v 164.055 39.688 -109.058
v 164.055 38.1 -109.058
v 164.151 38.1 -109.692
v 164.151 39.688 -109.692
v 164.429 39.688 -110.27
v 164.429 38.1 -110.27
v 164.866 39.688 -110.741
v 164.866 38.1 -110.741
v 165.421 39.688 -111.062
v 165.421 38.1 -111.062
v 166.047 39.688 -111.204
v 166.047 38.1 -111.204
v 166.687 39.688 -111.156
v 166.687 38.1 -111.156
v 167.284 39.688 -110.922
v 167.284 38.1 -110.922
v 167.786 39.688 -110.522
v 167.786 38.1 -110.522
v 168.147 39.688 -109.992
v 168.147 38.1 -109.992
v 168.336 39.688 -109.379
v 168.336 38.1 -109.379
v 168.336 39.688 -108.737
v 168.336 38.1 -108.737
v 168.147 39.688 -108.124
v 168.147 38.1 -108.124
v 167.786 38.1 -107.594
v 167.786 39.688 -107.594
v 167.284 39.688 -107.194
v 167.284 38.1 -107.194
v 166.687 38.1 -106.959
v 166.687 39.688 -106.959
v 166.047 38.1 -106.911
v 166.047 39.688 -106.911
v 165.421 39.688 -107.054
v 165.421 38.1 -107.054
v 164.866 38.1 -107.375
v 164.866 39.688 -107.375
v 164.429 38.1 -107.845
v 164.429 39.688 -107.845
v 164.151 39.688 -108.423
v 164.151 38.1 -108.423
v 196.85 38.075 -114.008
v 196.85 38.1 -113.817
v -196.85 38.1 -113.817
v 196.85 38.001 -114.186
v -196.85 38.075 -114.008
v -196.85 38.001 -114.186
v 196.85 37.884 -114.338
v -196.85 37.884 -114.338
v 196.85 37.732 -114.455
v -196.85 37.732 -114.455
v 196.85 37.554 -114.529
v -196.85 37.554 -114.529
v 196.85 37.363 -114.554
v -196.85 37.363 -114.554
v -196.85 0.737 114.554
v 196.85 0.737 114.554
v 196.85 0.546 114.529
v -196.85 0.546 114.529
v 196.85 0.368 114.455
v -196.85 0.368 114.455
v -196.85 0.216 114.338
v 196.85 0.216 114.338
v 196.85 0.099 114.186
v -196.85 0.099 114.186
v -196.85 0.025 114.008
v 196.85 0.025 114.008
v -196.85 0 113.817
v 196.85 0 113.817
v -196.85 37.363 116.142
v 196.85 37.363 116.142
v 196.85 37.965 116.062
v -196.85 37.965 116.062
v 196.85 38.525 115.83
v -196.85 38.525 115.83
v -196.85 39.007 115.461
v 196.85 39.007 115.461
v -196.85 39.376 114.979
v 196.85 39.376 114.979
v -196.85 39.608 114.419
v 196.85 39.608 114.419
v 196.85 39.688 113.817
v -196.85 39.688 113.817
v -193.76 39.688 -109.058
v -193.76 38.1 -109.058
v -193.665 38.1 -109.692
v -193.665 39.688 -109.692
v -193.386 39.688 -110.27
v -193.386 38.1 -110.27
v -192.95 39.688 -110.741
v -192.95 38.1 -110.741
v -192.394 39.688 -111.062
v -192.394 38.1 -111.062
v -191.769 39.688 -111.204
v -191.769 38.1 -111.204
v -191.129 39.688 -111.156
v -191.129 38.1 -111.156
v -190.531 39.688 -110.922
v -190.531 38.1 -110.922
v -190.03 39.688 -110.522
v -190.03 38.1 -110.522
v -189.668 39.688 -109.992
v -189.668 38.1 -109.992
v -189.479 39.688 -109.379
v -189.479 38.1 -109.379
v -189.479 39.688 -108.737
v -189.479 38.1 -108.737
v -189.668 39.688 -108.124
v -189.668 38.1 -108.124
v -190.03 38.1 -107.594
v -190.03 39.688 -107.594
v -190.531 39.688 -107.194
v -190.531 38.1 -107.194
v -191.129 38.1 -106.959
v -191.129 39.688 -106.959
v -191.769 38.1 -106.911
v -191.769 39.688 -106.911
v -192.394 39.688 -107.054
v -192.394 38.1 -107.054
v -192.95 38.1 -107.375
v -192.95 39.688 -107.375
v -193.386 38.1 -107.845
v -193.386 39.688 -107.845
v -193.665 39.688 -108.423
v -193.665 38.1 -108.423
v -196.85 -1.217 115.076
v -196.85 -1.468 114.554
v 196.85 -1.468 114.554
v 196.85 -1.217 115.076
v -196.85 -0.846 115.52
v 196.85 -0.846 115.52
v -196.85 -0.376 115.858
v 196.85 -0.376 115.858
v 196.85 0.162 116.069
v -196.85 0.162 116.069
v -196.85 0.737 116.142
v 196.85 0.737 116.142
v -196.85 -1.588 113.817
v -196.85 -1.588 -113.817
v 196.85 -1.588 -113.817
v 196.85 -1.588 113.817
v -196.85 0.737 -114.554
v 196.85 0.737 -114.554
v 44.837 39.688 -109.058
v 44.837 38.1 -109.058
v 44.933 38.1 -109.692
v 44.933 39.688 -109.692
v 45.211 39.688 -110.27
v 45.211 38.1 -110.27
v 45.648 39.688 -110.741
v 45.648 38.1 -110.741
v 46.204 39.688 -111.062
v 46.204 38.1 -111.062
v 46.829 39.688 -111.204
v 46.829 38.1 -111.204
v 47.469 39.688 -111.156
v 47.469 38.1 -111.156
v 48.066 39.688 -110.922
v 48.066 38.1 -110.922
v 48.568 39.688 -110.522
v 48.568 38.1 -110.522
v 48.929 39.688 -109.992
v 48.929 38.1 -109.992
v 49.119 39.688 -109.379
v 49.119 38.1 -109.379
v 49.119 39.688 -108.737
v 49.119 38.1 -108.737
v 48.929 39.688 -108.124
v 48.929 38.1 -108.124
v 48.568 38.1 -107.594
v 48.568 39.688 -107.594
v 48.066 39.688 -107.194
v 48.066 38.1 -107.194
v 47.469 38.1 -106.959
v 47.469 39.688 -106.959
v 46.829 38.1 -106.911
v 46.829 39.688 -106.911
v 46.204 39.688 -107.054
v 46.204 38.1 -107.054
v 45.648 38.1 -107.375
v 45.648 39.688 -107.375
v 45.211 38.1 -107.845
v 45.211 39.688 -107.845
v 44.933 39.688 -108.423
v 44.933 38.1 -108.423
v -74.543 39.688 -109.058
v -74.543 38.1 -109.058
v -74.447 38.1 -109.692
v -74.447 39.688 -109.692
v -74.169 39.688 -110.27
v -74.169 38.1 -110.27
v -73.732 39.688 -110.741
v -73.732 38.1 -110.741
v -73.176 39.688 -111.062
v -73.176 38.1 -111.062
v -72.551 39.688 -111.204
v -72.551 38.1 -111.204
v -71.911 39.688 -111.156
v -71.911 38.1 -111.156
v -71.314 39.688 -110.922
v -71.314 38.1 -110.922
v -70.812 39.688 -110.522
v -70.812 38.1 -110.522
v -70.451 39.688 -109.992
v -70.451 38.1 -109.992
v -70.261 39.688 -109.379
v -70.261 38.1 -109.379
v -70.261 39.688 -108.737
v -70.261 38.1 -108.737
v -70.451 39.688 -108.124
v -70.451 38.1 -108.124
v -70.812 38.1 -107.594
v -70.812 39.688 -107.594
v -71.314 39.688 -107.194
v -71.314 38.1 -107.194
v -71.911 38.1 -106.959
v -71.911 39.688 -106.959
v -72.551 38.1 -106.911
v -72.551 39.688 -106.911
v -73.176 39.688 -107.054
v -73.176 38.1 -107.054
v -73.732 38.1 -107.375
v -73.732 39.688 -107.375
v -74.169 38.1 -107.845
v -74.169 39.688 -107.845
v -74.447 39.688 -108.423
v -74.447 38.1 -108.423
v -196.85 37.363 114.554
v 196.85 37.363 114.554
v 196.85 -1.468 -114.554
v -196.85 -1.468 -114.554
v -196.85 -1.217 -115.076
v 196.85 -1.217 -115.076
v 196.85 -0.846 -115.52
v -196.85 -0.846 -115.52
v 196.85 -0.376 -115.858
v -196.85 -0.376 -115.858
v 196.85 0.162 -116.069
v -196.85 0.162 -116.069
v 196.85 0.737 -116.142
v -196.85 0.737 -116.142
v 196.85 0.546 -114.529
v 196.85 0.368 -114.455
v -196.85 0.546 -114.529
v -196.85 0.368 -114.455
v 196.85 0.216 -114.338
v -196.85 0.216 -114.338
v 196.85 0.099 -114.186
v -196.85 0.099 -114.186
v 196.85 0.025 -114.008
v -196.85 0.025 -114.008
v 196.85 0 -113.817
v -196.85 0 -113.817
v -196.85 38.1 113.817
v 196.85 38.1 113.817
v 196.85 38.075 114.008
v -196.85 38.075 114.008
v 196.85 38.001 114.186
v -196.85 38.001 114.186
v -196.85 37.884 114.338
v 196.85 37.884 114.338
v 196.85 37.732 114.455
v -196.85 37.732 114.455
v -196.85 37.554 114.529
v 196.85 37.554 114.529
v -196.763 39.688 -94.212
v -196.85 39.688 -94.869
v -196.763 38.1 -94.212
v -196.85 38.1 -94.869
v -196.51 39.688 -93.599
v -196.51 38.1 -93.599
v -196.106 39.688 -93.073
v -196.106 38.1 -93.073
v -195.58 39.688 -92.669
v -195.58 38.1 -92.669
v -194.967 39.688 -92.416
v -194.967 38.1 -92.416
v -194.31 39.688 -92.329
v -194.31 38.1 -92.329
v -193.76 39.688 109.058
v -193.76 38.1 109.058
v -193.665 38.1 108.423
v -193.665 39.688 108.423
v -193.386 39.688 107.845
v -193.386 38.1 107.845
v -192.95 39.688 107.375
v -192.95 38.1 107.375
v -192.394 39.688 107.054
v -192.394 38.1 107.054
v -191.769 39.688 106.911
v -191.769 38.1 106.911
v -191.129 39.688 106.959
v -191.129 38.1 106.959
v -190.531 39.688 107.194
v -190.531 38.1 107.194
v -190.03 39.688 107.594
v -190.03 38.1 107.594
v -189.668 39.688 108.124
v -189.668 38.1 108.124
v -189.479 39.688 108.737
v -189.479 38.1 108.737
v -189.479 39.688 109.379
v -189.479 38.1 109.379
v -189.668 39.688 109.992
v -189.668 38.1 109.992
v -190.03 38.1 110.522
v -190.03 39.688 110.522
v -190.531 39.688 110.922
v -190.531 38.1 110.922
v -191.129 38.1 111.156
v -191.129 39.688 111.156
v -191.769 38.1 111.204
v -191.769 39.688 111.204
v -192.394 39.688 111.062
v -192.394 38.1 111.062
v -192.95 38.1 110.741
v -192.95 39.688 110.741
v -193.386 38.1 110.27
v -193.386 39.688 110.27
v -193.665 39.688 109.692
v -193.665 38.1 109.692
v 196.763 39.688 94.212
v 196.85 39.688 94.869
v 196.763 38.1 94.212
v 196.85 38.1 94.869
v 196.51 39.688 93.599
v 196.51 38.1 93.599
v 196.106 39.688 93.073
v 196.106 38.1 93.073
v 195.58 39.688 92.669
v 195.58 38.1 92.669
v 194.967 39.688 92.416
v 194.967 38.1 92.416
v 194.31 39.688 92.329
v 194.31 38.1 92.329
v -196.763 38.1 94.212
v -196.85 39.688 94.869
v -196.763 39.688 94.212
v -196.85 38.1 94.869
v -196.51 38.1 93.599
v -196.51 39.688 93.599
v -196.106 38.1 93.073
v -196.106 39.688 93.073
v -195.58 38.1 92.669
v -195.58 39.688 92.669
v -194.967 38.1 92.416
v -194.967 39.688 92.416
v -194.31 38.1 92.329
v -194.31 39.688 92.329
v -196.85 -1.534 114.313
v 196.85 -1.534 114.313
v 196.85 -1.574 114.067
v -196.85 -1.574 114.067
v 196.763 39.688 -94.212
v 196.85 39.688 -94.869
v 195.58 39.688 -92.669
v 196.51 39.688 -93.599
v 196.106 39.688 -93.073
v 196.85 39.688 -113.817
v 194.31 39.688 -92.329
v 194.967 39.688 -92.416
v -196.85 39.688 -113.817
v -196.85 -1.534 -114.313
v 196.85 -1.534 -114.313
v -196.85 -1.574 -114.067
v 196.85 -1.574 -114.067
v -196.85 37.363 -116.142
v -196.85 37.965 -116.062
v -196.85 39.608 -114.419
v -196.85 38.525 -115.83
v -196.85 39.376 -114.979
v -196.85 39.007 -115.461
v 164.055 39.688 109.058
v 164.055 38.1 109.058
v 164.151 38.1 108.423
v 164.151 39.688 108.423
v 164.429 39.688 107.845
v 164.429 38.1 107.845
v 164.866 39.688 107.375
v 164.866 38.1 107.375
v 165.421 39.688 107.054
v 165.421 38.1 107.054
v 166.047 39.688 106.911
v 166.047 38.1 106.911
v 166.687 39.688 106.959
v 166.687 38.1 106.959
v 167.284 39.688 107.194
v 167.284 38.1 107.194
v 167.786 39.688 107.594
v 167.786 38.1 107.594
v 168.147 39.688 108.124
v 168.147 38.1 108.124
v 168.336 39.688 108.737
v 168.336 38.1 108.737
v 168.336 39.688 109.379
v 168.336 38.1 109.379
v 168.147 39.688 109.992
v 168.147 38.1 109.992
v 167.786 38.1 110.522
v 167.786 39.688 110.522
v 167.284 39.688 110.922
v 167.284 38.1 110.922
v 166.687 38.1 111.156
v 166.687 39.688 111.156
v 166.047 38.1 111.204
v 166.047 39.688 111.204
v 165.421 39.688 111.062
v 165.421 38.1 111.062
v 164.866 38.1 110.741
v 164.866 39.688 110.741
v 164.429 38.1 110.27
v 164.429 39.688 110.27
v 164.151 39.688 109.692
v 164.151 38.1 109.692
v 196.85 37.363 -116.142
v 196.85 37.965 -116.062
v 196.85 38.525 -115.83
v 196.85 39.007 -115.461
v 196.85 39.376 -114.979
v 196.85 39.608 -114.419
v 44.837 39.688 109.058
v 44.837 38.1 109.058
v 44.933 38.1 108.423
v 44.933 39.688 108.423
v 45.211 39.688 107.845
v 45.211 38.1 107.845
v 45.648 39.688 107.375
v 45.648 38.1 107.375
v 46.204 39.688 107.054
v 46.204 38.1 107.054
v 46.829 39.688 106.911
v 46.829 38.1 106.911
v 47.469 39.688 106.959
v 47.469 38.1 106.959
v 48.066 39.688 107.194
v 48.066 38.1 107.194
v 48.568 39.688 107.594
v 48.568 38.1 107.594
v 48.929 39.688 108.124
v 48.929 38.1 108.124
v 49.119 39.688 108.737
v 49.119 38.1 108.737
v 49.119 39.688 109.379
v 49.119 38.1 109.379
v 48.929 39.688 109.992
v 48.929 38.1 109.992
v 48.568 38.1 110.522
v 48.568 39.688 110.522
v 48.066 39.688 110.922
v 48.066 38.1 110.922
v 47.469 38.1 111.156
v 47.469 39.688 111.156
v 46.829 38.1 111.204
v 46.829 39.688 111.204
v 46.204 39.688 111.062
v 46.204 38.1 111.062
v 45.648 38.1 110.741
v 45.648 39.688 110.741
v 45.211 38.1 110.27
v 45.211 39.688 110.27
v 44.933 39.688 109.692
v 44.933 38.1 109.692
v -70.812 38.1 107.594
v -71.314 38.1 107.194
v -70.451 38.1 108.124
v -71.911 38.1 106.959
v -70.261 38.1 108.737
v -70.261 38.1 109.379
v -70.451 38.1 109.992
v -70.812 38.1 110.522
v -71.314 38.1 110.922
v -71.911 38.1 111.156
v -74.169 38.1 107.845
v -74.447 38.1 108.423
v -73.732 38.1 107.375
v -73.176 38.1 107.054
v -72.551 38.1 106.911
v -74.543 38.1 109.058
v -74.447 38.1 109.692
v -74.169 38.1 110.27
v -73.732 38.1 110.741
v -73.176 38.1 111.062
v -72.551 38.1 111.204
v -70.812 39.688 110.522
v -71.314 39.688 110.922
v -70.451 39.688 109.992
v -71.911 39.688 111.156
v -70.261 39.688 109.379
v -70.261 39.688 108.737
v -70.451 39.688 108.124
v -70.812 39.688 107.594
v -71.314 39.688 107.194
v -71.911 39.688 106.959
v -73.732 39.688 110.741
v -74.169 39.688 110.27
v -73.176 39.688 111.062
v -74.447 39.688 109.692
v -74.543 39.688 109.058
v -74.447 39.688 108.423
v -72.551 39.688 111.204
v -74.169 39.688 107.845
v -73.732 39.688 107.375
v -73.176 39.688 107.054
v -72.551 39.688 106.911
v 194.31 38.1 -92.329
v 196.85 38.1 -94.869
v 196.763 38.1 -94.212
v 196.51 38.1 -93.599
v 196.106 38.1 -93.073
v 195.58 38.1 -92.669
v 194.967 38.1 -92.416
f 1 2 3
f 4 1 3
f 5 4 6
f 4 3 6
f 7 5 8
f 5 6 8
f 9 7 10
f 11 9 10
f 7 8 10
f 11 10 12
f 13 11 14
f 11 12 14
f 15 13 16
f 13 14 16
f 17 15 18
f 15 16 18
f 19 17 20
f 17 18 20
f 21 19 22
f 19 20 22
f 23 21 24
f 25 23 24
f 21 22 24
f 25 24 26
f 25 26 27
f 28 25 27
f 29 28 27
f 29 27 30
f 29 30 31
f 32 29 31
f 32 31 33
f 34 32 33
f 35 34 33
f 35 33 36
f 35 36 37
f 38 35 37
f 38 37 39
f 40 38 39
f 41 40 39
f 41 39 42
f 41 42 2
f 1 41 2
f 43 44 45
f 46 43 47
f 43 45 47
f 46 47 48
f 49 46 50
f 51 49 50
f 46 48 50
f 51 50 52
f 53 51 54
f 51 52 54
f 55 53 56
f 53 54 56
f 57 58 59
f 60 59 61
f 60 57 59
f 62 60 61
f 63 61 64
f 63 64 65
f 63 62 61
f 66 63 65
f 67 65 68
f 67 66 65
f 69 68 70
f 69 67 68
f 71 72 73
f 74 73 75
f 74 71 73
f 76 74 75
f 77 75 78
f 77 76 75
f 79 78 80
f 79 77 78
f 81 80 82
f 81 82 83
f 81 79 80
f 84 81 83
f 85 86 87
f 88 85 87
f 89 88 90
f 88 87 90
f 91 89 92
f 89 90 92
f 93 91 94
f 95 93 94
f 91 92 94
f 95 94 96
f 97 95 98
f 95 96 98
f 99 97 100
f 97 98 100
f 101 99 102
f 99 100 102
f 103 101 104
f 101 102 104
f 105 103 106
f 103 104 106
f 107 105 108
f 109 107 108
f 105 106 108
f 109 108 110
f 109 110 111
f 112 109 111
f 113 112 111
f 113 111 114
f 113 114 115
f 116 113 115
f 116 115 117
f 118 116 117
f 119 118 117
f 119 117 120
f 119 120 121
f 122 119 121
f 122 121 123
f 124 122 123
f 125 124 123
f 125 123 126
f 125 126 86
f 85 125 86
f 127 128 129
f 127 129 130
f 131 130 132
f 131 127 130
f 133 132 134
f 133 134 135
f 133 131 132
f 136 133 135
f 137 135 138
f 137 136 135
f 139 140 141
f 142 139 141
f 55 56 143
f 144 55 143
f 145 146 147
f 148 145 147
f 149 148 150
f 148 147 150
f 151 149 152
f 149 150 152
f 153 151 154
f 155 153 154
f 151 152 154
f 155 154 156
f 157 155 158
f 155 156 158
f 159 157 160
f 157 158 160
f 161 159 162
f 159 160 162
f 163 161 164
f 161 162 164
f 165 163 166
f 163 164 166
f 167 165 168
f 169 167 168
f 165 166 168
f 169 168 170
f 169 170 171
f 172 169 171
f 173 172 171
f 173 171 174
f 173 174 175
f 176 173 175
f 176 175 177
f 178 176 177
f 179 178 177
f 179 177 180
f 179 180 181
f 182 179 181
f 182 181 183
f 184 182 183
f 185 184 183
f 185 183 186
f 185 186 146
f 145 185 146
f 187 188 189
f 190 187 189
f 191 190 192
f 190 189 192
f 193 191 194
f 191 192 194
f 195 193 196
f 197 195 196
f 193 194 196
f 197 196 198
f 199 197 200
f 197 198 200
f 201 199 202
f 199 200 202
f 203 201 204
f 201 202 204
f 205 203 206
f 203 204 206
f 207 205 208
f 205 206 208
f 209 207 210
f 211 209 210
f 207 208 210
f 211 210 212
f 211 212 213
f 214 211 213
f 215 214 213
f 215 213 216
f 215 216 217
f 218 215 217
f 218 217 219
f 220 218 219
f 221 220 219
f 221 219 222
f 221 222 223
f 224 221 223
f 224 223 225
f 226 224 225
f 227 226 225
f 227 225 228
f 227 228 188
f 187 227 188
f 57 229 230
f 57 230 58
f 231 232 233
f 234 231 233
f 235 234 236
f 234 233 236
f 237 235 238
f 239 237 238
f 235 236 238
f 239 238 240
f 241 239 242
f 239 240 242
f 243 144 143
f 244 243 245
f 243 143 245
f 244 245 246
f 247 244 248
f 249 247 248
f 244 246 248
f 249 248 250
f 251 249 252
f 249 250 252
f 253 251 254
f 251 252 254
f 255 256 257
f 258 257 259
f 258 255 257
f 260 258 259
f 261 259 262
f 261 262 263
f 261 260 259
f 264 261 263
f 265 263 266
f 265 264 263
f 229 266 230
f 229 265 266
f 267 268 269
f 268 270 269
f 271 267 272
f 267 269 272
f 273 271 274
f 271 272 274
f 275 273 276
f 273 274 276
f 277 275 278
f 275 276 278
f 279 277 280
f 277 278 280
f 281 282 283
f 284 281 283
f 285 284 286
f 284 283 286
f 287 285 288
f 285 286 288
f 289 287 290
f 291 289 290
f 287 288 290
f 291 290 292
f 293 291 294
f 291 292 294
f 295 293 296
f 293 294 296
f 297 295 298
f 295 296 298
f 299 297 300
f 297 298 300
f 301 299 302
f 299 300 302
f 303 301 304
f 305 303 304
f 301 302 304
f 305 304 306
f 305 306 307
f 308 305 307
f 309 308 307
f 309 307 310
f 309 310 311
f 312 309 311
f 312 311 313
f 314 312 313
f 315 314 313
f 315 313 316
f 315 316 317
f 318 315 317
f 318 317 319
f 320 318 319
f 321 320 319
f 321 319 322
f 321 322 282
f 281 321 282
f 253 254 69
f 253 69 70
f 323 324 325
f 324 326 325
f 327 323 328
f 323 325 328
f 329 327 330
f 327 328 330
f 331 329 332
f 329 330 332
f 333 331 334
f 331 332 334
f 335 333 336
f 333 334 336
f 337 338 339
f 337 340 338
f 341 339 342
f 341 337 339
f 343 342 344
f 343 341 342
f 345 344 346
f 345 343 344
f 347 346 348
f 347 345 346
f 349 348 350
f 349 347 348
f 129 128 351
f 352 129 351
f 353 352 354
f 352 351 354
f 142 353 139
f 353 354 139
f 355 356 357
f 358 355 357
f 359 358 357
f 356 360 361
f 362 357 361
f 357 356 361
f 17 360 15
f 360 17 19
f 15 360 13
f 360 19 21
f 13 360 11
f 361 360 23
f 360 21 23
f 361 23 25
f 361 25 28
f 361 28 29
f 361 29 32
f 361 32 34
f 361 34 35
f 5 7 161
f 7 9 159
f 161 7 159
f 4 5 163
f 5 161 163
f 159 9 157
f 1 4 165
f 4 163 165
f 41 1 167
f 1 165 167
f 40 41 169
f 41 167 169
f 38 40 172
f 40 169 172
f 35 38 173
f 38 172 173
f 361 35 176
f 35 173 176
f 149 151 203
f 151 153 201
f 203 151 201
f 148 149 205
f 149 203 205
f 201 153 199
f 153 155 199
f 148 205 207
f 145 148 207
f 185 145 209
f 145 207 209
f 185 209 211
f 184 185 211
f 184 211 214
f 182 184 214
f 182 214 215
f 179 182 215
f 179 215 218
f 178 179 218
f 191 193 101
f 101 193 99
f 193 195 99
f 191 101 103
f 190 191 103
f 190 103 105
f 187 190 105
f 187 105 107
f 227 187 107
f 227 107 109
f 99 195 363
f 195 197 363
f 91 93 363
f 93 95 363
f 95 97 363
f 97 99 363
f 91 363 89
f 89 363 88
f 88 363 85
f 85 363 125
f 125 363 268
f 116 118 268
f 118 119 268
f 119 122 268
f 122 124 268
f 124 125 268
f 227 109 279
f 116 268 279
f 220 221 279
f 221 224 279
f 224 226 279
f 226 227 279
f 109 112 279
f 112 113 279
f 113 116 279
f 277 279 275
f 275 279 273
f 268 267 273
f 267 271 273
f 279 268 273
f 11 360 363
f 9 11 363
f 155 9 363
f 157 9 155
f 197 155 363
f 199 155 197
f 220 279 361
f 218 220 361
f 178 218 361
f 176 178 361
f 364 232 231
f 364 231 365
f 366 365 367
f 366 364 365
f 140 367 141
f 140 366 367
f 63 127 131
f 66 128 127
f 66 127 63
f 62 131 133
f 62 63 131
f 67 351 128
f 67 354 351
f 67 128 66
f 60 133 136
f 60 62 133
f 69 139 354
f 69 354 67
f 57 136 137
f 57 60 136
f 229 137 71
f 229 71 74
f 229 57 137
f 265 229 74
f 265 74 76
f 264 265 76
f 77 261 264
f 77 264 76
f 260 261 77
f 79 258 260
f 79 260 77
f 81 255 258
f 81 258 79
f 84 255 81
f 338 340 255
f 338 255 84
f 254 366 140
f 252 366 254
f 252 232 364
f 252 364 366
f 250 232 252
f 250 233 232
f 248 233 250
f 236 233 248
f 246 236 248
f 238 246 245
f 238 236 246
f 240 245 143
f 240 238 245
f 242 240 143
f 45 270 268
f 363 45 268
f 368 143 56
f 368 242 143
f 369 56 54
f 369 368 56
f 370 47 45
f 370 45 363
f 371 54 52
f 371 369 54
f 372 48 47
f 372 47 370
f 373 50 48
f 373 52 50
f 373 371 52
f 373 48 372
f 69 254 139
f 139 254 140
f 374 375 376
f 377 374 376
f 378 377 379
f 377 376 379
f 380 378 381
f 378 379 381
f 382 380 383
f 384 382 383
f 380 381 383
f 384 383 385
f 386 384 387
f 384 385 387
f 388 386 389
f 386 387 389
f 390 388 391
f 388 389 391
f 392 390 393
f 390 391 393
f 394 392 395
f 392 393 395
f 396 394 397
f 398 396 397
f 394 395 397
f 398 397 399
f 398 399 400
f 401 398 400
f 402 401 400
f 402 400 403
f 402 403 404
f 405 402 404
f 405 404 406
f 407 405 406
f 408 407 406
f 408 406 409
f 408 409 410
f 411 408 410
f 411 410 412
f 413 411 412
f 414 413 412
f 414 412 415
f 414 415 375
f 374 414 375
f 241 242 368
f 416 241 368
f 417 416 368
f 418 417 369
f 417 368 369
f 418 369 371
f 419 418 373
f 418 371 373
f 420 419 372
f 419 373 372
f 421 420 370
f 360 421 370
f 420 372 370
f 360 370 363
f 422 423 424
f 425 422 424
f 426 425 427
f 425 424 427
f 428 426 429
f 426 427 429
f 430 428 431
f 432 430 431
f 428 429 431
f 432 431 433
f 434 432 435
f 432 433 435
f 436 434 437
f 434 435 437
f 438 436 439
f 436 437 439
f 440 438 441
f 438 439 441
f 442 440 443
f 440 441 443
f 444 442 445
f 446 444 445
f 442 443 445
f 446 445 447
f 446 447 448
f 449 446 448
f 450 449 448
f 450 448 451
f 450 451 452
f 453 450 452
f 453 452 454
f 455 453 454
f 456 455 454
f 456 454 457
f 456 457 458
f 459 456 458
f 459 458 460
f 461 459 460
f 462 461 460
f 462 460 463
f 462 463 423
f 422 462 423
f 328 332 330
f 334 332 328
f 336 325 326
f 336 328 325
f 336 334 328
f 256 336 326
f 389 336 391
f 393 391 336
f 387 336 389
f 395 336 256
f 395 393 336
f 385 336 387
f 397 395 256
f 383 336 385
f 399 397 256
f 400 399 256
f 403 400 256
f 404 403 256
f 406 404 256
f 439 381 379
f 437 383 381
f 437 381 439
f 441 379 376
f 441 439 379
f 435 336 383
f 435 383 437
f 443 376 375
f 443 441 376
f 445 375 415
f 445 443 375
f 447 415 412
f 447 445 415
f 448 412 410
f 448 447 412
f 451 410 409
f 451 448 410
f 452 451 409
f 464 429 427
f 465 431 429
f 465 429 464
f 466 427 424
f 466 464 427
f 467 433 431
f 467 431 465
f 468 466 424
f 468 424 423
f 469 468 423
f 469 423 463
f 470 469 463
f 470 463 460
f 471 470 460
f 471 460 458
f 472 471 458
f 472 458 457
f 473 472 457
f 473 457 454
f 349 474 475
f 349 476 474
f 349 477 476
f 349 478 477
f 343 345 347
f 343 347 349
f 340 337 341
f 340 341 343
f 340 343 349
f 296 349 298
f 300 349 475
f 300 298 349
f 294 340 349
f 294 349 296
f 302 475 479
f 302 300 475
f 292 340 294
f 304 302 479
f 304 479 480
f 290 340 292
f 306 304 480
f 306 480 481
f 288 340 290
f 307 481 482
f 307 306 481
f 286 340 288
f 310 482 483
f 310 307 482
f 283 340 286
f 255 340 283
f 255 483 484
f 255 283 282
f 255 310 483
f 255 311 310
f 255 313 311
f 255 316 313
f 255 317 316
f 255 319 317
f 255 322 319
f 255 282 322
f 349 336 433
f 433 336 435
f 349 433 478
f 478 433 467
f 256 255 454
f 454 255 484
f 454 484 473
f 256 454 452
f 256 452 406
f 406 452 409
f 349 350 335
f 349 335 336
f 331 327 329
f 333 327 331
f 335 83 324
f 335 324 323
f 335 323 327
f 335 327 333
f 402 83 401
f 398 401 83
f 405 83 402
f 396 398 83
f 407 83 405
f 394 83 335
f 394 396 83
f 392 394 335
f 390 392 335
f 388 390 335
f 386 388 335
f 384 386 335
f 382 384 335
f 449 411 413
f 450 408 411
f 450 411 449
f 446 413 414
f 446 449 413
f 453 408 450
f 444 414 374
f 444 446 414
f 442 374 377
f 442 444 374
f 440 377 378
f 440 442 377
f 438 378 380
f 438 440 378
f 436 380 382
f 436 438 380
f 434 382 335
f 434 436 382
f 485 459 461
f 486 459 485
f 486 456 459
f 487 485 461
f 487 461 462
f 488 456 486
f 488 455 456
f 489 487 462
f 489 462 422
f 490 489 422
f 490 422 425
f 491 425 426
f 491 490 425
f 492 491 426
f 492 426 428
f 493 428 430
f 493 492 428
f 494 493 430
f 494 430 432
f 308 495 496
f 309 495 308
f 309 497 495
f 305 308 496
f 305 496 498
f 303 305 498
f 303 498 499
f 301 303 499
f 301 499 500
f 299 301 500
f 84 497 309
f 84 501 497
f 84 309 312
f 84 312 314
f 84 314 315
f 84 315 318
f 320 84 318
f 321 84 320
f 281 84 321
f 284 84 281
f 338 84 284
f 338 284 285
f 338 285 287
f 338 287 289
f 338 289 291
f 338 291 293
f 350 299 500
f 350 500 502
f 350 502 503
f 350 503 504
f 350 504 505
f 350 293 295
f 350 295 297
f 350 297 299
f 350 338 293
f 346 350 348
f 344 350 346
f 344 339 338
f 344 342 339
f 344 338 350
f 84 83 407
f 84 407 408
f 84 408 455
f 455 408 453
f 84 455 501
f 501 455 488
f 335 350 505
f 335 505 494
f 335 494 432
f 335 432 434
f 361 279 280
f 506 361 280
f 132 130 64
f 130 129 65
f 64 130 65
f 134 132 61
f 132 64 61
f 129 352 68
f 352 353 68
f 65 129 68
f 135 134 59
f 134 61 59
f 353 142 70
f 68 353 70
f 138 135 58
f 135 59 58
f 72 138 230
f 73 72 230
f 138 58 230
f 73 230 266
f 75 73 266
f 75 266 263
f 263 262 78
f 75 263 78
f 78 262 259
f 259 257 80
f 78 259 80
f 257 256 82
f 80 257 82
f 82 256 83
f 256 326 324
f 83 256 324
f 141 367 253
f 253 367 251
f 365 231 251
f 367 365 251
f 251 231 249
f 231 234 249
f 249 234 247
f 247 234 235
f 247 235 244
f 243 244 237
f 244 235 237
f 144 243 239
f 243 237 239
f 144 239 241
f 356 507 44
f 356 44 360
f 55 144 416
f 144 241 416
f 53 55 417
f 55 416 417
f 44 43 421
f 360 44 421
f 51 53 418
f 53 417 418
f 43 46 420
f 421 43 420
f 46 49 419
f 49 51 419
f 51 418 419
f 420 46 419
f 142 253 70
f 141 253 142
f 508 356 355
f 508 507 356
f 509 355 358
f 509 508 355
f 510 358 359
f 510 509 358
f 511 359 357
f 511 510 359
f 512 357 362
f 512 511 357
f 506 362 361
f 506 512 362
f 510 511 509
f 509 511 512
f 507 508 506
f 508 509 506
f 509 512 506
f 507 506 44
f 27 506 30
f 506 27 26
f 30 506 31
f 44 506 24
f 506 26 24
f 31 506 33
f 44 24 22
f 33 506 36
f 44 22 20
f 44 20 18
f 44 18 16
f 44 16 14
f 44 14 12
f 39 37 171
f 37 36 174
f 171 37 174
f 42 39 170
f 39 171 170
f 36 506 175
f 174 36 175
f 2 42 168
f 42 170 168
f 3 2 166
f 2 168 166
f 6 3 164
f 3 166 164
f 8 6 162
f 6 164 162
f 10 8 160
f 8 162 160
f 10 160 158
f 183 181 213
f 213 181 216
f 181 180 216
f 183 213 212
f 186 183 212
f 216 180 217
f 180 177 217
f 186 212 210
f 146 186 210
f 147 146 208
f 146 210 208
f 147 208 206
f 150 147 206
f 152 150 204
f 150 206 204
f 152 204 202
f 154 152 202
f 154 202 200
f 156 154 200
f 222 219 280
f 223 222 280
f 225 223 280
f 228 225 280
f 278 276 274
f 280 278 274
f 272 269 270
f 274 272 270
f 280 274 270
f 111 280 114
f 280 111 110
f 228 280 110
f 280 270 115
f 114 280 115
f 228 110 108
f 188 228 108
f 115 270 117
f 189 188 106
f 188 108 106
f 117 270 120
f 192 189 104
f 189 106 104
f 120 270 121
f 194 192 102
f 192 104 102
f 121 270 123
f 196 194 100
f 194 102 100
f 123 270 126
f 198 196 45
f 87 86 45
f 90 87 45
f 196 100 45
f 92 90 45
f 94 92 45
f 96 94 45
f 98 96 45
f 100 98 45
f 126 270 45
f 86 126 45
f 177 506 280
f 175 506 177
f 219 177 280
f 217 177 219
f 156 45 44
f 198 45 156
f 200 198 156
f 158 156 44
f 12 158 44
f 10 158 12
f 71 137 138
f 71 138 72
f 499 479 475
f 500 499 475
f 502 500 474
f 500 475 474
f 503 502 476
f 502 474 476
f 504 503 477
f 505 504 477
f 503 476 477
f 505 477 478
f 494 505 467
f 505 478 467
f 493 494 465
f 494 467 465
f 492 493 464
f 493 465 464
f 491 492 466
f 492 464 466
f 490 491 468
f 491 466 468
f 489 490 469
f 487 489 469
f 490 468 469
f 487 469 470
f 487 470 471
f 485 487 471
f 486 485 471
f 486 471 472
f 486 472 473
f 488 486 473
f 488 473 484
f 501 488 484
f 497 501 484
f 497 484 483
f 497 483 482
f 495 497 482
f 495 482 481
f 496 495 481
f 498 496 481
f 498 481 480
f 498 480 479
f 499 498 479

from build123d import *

# Parameters (mm, degrees)
SKETCH1_W                 = 393.7
SKETCH1_H                 = 229.108
BASE_FLANGE1_DEPTH        = 1.5875
MITER_START               = -196.85
MITER_FLANGE1_DEPTH       = 393.7
MITER_FLANGE1_2_DEPTH     = 393.7
F_8_CLEARANCE_HOLE1_D     = 4.3053
F_8_CLEARANCE_HOLE1_DEPTH = 1.5875
FILLET1_R                 = 2.54


# Read off the part's stored shape, not the designer's step: Miter Flange1
# Sheet-metal steps are written as plain solids
with BuildPart() as part:
    # Sketch1 → Base-Flange1 (new body)
    with BuildSketch(Plane(origin=(0, 0, 0), x_dir=(1, 0, 0), z_dir=(0, 1, 0))):
        Rectangle(SKETCH1_W, SKETCH1_H)
    extrude(amount=-BASE_FLANGE1_DEPTH)

    # Miter Flange1 outline → Miter Flange1 (cut)
    with BuildSketch(Plane.YZ.offset(MITER_START)):
        with BuildLine():
            Line((-1.5875, -114.554), (-1.467682479, -114.554))
            ThreePointArc((-1.467682479, -114.554), (-1.557350056, -114.190540657), (-1.5875, -113.8174))
            Line((-1.5875, -113.8174), (-1.5875, -114.554))
        make_face()
    miter_flange1 = extrude(amount=MITER_FLANGE1_DEPTH, mode=Mode.SUBTRACT)

    # Miter Flange1 2 outline → Miter Flange1 2 (add)
    with BuildSketch(Plane.YZ.offset(MITER_START)):
        with BuildLine():
            Line((39.6875, -113.8174), (39.6875, -92.329))
            Line((39.6875, -92.329), (38.1, -92.329))
            Line((38.1, -92.329), (38.1, -113.8174))
            ThreePointArc((38.1, -113.8174), (37.884254855, -114.338254855), (37.3634, -114.554))
            Line((37.3634, -114.554), (0.7366, -114.554))
            ThreePointArc((0.7366, -114.554), (0.215745145, -114.338254855), (0, -113.8174))
            Line((0, -113.8174), (0, -114.554))
            Line((0, -114.554), (-1.467682479, -114.554))
            ThreePointArc((-1.467682479, -114.554), (-0.621617352, -115.703317929), (0.7366, -116.1415))
            Line((0.7366, -116.1415), (37.3634, -116.1415))
            ThreePointArc((37.3634, -116.1415), (39.00678687, -115.46078687), (39.6875, -113.8174))
        make_face()
    miter_flange1_2 = extrude(amount=MITER_FLANGE1_2_DEPTH)

    # Mirror1: Miter Flange1, Miter Flange1 2 across plane
    add(miter_flange1.mirror(Plane.XY), mode=Mode.SUBTRACT)
    add(miter_flange1_2.mirror(Plane.XY))

    # #8 Clearance Hole1
    with Locations(Plane(origin=(0, 39.6875, 0), x_dir=(1, 0, 0), z_dir=(0, 1, 0))):
        with Locations((166.207772673, -109.057772673), (46.99, -109.057772673), (-72.39, -109.057772673), (-191.607772673, -109.057772673), (-191.607772673, 109.057772673), (-72.39, 109.057772673), (46.99, 109.057772673), (166.207772673, 109.057772673)):
            Hole(F_8_CLEARANCE_HOLE1_D / 2, depth=F_8_CLEARANCE_HOLE1_DEPTH)

    # Fillet1
    fillet1_edges = [part.edges().sort_by_distance(p)[0] for p in [
        (-196.85, 38.89375, -92.329),
        (196.85, 38.89375, -92.329),
        (-196.85, 38.89375, 92.329),
        (196.85, 38.89375, 92.329),
    ]]
    fillet(fillet1_edges, radius=FILLET1_R)


solid = part.part
